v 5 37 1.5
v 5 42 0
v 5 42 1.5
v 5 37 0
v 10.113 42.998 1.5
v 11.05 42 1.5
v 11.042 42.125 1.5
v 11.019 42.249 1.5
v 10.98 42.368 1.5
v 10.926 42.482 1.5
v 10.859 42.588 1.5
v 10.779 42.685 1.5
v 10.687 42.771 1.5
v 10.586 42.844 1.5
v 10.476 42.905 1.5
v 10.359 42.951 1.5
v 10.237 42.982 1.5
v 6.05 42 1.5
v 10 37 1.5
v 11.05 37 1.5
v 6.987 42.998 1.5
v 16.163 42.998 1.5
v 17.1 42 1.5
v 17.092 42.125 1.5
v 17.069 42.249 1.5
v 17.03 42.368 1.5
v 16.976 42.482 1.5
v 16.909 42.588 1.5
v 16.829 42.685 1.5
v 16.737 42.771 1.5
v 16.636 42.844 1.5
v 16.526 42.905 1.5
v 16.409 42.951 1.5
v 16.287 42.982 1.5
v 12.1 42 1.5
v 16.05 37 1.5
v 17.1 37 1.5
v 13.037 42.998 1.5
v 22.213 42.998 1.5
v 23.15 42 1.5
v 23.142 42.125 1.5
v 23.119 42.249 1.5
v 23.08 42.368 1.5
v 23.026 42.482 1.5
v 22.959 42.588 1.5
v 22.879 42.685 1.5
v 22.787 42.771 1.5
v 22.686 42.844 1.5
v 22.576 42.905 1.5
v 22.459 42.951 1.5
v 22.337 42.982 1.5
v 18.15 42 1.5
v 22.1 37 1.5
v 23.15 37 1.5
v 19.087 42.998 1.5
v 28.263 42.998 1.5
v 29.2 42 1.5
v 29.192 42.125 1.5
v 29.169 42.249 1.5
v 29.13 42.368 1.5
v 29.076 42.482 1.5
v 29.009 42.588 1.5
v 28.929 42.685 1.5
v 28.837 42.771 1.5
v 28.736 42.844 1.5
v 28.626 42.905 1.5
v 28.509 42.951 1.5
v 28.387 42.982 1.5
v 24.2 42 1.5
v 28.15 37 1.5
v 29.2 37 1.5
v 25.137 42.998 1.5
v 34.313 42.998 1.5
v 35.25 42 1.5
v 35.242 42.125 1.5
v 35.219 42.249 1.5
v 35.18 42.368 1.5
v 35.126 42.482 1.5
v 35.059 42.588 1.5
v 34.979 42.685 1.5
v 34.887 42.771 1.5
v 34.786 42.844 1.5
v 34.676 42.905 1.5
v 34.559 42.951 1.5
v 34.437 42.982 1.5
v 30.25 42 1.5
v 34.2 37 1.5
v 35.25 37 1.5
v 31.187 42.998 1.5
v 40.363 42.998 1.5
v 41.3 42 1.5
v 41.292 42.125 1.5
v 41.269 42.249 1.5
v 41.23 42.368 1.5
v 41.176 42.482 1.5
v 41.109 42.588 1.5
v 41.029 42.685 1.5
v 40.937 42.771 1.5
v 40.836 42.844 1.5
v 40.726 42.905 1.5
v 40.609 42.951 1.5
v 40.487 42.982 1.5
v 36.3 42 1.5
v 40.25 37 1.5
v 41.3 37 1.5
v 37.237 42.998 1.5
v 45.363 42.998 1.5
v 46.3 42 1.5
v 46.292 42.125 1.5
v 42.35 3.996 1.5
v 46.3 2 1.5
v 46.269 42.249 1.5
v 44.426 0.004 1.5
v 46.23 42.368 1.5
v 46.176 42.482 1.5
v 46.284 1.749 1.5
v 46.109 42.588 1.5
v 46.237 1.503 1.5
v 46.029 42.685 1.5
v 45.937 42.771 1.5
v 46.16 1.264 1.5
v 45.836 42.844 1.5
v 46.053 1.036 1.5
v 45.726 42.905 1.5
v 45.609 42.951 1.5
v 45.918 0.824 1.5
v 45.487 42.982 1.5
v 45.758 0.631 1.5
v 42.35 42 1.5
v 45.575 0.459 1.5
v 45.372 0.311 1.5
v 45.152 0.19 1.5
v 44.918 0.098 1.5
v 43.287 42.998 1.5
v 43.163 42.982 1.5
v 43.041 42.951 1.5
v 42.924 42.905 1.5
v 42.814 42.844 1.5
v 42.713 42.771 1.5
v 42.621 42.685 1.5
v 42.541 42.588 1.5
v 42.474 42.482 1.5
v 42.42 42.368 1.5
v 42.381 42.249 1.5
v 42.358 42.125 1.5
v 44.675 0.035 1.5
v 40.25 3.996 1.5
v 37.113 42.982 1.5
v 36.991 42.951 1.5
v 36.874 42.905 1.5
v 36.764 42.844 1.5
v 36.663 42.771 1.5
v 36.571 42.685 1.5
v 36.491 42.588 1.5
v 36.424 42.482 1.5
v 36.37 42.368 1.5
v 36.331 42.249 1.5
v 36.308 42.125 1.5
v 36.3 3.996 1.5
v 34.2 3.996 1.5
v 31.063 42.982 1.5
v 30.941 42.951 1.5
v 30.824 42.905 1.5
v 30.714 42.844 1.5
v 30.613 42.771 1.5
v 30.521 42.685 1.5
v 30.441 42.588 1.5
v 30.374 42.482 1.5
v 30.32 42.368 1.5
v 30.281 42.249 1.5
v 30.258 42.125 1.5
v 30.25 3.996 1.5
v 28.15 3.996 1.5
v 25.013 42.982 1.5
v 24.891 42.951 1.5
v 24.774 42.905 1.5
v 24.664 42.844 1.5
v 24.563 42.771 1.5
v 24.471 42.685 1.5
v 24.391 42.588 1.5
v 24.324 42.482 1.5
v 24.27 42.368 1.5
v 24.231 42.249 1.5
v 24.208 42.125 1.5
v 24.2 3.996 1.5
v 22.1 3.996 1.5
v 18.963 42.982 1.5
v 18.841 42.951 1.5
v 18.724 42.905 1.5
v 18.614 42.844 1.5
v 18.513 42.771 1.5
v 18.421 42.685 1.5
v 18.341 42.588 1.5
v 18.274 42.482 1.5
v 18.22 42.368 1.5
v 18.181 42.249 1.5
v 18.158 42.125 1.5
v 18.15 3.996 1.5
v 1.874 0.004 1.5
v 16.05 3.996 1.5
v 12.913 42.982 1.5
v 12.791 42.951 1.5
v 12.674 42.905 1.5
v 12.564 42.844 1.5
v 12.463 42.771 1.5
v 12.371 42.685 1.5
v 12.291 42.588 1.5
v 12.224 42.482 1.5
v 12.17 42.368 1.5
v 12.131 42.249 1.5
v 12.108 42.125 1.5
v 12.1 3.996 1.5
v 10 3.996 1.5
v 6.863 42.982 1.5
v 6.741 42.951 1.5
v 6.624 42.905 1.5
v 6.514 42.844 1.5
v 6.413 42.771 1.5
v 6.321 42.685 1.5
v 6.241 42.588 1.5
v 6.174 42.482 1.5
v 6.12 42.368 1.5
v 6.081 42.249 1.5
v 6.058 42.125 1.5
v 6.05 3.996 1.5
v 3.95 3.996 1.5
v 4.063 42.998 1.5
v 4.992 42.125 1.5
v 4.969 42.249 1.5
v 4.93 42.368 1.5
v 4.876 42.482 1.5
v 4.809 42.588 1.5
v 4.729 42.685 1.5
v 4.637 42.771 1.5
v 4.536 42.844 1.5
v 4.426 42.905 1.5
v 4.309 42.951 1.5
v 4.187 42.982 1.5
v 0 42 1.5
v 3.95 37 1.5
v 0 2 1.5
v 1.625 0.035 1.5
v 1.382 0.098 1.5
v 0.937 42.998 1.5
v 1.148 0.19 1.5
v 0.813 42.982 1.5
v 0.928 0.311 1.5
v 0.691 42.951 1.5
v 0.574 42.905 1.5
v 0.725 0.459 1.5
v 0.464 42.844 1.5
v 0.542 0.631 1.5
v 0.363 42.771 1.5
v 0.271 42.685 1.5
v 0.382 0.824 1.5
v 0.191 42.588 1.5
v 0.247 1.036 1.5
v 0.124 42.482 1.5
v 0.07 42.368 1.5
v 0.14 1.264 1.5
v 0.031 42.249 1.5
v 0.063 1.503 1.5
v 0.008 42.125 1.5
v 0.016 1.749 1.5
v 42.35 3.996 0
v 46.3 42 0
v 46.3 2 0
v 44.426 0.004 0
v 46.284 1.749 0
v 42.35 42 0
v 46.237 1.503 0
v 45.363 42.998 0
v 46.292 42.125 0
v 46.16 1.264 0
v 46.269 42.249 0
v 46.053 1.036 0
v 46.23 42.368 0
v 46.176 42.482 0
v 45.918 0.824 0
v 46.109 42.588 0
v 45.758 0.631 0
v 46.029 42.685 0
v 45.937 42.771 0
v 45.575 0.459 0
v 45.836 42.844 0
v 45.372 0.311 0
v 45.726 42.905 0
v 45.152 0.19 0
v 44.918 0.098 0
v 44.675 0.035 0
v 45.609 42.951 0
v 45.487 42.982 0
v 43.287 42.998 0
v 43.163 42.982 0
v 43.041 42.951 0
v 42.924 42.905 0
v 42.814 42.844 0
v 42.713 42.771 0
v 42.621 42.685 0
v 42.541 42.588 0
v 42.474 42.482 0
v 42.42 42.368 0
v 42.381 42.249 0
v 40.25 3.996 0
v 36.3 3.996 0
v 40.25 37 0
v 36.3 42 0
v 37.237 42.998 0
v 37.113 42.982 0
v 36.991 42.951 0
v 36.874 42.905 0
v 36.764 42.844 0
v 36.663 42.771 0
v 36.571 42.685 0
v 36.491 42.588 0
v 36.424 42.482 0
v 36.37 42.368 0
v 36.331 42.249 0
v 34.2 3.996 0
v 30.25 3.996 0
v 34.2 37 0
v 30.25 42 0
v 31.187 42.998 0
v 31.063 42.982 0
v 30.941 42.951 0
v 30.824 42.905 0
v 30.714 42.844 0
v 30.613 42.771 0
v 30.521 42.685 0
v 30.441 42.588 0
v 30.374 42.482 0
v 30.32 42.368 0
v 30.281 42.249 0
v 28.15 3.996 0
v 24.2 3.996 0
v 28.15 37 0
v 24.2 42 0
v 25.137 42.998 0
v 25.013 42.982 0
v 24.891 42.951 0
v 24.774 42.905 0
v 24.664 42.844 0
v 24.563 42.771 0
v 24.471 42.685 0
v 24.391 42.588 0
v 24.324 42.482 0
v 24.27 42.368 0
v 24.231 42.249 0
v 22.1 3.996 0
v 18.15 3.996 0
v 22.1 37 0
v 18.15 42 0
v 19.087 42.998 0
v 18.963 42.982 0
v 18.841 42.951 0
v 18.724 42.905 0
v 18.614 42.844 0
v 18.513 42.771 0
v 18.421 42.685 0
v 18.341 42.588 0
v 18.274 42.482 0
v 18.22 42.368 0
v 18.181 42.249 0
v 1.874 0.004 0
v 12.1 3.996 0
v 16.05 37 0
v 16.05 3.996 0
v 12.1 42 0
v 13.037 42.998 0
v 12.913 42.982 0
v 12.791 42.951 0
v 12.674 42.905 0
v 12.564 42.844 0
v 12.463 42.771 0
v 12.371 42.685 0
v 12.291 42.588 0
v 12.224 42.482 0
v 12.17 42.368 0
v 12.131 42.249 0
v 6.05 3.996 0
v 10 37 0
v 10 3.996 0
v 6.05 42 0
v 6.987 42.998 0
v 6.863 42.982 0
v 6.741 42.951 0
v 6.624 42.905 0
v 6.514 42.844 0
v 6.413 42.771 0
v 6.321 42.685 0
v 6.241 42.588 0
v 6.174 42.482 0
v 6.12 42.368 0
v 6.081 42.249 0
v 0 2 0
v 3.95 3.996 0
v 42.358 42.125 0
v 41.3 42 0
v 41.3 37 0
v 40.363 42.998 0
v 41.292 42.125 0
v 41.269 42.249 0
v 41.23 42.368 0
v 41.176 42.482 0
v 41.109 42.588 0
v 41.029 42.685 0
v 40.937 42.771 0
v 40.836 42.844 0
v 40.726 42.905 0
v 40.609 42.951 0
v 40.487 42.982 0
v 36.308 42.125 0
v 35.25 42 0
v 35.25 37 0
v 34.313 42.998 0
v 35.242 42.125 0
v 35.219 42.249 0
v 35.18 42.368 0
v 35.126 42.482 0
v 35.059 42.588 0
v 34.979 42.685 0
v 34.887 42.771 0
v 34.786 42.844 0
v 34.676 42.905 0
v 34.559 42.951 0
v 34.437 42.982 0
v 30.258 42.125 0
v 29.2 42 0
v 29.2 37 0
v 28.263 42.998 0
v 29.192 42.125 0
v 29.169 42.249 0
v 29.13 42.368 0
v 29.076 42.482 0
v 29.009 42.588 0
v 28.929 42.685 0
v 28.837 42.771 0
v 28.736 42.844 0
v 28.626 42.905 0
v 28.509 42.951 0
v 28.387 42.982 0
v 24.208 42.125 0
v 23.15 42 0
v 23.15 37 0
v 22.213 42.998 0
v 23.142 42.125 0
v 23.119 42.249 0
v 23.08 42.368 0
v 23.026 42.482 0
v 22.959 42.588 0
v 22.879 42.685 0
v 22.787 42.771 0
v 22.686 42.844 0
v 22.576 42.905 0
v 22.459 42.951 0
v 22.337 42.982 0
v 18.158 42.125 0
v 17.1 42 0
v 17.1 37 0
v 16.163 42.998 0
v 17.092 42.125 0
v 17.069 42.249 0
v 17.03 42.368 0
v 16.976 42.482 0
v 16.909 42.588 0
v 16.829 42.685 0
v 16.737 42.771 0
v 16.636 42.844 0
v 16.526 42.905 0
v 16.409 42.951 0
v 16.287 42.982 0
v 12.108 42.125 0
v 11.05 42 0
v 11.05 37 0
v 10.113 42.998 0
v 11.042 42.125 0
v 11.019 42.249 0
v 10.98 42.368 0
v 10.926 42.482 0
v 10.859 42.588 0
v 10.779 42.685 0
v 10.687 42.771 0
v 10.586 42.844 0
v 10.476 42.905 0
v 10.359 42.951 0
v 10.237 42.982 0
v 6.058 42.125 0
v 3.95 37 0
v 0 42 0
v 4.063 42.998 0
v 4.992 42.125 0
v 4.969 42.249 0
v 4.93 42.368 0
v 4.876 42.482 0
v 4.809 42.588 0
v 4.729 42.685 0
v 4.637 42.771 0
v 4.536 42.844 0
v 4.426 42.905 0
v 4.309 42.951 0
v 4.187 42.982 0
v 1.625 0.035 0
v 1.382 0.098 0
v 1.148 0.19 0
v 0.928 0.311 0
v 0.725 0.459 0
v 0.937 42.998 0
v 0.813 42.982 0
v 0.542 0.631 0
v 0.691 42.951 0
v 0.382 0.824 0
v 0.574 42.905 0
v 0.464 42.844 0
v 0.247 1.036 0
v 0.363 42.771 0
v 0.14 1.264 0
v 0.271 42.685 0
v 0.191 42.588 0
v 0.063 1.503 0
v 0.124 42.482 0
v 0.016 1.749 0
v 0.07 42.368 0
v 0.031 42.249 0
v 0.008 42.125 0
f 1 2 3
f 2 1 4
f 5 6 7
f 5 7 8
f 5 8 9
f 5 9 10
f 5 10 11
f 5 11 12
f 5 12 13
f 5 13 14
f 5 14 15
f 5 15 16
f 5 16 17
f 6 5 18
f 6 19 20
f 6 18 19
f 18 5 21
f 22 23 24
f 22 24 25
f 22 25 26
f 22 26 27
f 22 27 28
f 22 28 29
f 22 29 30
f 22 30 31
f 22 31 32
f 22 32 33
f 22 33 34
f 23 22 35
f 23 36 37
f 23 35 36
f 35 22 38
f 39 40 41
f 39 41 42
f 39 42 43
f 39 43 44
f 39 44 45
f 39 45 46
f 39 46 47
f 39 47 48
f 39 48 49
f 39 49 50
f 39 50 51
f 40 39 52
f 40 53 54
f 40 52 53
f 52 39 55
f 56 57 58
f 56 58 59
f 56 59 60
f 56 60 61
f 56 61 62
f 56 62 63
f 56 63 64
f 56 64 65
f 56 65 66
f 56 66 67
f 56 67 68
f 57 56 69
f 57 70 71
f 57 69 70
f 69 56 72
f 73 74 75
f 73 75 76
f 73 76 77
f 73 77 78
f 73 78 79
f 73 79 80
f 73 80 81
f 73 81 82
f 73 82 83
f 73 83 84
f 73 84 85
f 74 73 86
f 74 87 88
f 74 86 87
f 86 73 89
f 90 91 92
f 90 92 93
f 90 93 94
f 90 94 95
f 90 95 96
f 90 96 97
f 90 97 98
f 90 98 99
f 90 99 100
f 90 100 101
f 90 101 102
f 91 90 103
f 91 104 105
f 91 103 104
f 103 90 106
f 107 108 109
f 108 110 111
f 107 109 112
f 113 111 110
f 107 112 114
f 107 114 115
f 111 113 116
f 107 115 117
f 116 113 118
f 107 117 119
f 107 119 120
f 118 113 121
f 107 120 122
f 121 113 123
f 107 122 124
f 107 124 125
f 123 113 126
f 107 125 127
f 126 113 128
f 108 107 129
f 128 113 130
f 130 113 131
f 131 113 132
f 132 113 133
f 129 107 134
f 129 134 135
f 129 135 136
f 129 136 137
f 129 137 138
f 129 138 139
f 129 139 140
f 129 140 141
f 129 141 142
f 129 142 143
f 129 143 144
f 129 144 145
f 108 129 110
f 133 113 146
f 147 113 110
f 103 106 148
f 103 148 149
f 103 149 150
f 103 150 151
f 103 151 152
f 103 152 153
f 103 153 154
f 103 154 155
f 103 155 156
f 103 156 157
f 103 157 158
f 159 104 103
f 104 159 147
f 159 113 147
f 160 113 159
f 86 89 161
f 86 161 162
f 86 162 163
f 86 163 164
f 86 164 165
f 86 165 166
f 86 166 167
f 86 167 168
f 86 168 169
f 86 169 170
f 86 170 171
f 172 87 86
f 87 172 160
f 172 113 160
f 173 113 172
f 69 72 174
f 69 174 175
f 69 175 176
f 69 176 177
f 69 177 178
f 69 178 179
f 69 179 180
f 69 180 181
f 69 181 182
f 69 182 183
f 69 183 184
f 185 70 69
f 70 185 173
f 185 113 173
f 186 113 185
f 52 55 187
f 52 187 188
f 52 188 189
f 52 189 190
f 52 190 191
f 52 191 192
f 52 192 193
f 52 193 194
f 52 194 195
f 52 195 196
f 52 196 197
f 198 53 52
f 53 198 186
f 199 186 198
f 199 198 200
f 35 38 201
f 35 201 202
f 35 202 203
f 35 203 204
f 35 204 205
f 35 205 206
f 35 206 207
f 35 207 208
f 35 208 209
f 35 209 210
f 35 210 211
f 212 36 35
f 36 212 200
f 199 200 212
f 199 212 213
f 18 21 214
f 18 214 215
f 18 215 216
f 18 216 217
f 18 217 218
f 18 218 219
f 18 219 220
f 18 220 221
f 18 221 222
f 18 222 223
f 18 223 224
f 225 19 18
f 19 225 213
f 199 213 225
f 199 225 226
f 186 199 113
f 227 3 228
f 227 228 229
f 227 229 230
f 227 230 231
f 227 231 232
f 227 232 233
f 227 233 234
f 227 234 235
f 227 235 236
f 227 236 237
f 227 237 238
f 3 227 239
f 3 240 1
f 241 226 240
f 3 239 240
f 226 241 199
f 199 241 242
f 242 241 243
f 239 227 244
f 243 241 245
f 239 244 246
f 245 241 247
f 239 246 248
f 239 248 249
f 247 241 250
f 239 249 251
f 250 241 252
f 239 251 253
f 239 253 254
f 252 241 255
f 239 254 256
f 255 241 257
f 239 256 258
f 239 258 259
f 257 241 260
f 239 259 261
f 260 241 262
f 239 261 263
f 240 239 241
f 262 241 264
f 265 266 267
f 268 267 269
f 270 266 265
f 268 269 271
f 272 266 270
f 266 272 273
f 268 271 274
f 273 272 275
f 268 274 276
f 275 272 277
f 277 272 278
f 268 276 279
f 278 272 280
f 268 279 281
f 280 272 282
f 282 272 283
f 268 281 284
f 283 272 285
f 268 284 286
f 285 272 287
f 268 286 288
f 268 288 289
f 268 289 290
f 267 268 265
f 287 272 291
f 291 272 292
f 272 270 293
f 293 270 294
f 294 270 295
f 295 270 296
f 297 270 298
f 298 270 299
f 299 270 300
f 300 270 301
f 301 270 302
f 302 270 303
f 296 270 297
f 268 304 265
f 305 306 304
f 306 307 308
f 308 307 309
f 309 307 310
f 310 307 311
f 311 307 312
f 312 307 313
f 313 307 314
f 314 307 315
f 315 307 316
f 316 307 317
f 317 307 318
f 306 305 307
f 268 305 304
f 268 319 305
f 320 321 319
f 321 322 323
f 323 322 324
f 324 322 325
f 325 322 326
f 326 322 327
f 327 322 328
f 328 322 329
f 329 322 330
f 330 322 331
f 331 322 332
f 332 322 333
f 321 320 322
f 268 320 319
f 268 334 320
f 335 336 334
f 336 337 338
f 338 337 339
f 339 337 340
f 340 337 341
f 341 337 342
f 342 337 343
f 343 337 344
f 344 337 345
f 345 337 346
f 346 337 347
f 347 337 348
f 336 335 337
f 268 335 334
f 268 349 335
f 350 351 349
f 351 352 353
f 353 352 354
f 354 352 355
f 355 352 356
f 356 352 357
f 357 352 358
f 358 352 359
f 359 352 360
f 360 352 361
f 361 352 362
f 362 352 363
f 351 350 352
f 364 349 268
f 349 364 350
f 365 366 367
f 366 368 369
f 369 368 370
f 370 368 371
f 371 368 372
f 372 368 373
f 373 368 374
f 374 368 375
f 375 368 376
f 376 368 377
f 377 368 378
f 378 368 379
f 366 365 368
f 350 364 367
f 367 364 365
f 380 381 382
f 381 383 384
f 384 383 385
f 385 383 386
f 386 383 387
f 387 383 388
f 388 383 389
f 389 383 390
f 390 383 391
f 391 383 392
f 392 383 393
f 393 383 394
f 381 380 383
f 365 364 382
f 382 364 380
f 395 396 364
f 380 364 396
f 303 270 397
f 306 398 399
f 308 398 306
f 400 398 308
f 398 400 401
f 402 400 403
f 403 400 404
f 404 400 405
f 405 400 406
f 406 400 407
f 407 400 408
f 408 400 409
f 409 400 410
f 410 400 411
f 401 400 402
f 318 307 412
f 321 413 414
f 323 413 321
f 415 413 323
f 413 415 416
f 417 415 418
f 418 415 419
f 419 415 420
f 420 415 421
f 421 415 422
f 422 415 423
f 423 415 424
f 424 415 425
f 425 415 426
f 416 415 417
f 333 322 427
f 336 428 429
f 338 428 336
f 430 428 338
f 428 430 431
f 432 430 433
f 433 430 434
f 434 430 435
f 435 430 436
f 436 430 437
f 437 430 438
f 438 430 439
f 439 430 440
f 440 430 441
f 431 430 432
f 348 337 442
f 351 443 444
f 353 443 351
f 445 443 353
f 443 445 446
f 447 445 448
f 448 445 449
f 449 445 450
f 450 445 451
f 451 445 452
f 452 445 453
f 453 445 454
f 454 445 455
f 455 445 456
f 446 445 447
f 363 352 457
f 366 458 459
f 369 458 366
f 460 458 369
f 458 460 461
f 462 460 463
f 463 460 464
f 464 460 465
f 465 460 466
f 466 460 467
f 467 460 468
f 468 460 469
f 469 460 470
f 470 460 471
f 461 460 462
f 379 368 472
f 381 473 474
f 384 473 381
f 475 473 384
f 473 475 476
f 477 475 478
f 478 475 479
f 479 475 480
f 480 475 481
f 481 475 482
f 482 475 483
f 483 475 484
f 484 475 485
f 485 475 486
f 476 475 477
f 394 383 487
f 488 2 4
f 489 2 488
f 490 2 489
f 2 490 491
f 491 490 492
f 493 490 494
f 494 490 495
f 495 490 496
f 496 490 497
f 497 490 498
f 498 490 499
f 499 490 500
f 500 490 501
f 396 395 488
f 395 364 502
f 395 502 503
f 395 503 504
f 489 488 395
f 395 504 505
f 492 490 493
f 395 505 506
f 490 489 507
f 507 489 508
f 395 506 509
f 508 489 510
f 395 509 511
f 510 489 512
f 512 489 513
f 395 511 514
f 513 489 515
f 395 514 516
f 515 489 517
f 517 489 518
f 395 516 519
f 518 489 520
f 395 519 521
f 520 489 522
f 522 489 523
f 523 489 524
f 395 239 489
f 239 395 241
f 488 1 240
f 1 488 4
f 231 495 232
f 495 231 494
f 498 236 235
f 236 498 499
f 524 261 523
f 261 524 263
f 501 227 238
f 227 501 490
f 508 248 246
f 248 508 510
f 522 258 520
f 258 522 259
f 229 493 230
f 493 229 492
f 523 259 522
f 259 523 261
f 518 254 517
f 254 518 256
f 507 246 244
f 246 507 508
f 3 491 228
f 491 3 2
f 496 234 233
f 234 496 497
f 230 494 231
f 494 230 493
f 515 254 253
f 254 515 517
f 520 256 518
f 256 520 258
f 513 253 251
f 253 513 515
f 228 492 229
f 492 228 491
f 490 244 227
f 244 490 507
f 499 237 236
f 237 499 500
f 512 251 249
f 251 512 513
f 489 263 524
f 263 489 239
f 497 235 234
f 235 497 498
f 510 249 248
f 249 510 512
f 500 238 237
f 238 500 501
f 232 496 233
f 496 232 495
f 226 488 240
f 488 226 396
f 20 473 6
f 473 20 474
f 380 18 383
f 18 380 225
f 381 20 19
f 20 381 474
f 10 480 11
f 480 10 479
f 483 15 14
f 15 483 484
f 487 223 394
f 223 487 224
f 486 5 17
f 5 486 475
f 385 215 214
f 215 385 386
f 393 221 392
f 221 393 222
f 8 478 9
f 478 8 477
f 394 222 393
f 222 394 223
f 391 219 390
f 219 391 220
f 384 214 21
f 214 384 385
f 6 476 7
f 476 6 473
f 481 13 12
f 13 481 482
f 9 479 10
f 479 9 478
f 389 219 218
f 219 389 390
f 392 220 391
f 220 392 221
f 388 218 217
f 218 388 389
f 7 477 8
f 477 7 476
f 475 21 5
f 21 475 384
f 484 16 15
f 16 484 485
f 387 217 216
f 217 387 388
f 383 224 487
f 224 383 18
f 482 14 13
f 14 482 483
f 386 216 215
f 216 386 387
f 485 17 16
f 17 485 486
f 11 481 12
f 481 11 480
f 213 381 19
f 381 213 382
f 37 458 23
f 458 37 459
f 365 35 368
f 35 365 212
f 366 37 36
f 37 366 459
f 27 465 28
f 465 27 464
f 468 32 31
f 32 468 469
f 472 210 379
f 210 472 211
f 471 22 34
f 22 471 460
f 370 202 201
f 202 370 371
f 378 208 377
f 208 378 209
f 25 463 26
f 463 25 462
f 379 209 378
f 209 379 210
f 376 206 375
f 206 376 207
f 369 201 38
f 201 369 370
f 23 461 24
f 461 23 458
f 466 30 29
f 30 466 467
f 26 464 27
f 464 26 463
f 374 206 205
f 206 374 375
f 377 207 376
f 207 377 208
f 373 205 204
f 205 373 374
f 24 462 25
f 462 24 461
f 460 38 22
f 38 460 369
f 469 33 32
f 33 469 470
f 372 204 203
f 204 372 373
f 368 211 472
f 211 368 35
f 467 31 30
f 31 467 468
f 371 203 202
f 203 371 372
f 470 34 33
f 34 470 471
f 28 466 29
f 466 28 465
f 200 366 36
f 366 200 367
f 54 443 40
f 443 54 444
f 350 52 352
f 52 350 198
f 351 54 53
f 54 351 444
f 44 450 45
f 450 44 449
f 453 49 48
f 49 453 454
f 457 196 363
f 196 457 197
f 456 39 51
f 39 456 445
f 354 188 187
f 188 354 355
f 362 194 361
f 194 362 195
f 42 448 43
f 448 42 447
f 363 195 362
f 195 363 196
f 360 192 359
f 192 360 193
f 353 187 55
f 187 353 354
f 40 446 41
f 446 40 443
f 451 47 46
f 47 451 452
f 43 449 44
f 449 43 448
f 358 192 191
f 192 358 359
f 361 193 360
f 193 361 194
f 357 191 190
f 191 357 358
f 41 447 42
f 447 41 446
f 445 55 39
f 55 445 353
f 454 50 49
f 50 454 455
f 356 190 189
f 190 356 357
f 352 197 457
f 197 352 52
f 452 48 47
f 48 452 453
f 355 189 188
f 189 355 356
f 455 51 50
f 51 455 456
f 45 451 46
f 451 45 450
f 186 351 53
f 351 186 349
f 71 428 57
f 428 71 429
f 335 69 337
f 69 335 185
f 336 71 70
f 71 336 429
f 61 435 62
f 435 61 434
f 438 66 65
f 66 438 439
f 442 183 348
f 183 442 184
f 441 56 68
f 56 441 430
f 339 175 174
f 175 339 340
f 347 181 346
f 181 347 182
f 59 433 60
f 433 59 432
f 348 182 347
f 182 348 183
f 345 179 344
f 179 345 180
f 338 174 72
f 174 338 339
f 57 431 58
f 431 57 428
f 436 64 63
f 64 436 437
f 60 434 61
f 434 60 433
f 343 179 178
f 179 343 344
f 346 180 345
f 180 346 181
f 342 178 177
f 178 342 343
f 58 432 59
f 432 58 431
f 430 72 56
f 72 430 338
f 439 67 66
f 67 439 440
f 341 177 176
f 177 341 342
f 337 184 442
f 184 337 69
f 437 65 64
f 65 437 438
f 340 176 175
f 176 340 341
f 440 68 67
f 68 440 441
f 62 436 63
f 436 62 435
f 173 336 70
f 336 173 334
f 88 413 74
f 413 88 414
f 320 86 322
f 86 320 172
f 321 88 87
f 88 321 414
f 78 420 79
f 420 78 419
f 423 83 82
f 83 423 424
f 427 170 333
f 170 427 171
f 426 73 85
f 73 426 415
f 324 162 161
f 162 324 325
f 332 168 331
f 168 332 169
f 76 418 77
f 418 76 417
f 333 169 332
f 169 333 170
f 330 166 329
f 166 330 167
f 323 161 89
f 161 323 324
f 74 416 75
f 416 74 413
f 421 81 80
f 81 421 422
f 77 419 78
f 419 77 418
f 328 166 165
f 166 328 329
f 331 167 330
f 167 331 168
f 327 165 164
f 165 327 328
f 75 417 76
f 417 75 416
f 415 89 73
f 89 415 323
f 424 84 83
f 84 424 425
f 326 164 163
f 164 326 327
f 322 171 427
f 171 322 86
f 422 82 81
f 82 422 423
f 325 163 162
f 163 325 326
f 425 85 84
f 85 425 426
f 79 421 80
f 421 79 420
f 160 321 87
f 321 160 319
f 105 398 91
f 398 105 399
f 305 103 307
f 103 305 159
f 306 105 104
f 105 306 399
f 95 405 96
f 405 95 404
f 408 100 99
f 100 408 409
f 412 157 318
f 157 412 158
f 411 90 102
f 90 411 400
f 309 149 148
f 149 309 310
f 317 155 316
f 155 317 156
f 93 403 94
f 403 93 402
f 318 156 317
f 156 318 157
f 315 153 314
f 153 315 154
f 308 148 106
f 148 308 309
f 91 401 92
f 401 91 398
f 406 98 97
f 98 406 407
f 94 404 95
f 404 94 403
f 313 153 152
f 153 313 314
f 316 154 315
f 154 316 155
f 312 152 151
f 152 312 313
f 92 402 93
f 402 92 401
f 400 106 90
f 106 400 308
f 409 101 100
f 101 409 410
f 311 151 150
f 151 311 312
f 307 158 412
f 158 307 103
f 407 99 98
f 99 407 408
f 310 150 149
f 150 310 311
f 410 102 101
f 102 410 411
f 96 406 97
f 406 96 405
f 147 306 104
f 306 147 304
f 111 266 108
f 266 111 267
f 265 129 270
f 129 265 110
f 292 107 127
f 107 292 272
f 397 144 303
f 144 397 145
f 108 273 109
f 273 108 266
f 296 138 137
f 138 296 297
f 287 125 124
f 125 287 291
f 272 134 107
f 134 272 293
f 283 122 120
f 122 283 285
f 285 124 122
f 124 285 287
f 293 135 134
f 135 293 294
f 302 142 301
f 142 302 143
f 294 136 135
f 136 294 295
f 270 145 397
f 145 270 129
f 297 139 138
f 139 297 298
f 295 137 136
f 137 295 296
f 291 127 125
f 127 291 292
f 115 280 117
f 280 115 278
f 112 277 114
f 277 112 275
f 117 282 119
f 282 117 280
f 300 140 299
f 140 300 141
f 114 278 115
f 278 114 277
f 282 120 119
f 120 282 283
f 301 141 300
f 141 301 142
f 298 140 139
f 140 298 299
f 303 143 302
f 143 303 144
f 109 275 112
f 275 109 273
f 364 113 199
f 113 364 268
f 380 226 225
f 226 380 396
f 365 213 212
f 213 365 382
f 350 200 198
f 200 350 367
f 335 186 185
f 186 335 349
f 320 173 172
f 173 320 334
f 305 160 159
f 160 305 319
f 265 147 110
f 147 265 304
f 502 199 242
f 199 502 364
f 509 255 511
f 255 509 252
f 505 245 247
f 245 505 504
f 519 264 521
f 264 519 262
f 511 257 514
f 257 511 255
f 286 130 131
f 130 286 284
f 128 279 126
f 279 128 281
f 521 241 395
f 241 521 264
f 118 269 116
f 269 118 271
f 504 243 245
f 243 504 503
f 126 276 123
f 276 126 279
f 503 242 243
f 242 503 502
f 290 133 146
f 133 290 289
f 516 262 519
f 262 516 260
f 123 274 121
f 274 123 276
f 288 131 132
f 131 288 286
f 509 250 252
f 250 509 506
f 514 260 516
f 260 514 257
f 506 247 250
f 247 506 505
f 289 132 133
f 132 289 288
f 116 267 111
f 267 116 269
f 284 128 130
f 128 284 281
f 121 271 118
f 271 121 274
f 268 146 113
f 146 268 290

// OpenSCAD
columns = 8;        // number of columns
cap = 5;            // height of 'enter' cap
corner_radius = 2;  // radius of corners
height = 1.5;       // height of whole object
cable_width = 1.05; // cable width (add some reserve to pass though cap)
column_width = 5;   // column width in cap
length = 35;        // bigger length, more cables you can put

$fn=50;

hull() {
   translate ([corner_radius, corner_radius, 0]) {
    cylinder (h=height, r=corner_radius);
   }

   total_width = columns * (column_width+cable_width) - 2 * cable_width;   
   translate ([total_width - corner_radius, corner_radius, 0]) {
      cylinder (h=height, r=corner_radius); 
   }
}

for (i = [0:columns-1]) {
    translate([i * (column_width+cable_width), corner_radius, 0]) {
        cube([column_width - cable_width, length, height]);

        translate([0, length, 0]) {
            ci = column_width - (i + 1 == columns ? cable_width : 0);
            
            cube([ci, cap, height]);
            hull() {
                radius=1;
                translate([radius, cap, 0]) {
                    cylinder (h=height, r=radius); 
                }
                translate([ci-radius, cap, 0]) {
                    cylinder (h=height, r=radius); 
                }
            }
        }
    }
}
